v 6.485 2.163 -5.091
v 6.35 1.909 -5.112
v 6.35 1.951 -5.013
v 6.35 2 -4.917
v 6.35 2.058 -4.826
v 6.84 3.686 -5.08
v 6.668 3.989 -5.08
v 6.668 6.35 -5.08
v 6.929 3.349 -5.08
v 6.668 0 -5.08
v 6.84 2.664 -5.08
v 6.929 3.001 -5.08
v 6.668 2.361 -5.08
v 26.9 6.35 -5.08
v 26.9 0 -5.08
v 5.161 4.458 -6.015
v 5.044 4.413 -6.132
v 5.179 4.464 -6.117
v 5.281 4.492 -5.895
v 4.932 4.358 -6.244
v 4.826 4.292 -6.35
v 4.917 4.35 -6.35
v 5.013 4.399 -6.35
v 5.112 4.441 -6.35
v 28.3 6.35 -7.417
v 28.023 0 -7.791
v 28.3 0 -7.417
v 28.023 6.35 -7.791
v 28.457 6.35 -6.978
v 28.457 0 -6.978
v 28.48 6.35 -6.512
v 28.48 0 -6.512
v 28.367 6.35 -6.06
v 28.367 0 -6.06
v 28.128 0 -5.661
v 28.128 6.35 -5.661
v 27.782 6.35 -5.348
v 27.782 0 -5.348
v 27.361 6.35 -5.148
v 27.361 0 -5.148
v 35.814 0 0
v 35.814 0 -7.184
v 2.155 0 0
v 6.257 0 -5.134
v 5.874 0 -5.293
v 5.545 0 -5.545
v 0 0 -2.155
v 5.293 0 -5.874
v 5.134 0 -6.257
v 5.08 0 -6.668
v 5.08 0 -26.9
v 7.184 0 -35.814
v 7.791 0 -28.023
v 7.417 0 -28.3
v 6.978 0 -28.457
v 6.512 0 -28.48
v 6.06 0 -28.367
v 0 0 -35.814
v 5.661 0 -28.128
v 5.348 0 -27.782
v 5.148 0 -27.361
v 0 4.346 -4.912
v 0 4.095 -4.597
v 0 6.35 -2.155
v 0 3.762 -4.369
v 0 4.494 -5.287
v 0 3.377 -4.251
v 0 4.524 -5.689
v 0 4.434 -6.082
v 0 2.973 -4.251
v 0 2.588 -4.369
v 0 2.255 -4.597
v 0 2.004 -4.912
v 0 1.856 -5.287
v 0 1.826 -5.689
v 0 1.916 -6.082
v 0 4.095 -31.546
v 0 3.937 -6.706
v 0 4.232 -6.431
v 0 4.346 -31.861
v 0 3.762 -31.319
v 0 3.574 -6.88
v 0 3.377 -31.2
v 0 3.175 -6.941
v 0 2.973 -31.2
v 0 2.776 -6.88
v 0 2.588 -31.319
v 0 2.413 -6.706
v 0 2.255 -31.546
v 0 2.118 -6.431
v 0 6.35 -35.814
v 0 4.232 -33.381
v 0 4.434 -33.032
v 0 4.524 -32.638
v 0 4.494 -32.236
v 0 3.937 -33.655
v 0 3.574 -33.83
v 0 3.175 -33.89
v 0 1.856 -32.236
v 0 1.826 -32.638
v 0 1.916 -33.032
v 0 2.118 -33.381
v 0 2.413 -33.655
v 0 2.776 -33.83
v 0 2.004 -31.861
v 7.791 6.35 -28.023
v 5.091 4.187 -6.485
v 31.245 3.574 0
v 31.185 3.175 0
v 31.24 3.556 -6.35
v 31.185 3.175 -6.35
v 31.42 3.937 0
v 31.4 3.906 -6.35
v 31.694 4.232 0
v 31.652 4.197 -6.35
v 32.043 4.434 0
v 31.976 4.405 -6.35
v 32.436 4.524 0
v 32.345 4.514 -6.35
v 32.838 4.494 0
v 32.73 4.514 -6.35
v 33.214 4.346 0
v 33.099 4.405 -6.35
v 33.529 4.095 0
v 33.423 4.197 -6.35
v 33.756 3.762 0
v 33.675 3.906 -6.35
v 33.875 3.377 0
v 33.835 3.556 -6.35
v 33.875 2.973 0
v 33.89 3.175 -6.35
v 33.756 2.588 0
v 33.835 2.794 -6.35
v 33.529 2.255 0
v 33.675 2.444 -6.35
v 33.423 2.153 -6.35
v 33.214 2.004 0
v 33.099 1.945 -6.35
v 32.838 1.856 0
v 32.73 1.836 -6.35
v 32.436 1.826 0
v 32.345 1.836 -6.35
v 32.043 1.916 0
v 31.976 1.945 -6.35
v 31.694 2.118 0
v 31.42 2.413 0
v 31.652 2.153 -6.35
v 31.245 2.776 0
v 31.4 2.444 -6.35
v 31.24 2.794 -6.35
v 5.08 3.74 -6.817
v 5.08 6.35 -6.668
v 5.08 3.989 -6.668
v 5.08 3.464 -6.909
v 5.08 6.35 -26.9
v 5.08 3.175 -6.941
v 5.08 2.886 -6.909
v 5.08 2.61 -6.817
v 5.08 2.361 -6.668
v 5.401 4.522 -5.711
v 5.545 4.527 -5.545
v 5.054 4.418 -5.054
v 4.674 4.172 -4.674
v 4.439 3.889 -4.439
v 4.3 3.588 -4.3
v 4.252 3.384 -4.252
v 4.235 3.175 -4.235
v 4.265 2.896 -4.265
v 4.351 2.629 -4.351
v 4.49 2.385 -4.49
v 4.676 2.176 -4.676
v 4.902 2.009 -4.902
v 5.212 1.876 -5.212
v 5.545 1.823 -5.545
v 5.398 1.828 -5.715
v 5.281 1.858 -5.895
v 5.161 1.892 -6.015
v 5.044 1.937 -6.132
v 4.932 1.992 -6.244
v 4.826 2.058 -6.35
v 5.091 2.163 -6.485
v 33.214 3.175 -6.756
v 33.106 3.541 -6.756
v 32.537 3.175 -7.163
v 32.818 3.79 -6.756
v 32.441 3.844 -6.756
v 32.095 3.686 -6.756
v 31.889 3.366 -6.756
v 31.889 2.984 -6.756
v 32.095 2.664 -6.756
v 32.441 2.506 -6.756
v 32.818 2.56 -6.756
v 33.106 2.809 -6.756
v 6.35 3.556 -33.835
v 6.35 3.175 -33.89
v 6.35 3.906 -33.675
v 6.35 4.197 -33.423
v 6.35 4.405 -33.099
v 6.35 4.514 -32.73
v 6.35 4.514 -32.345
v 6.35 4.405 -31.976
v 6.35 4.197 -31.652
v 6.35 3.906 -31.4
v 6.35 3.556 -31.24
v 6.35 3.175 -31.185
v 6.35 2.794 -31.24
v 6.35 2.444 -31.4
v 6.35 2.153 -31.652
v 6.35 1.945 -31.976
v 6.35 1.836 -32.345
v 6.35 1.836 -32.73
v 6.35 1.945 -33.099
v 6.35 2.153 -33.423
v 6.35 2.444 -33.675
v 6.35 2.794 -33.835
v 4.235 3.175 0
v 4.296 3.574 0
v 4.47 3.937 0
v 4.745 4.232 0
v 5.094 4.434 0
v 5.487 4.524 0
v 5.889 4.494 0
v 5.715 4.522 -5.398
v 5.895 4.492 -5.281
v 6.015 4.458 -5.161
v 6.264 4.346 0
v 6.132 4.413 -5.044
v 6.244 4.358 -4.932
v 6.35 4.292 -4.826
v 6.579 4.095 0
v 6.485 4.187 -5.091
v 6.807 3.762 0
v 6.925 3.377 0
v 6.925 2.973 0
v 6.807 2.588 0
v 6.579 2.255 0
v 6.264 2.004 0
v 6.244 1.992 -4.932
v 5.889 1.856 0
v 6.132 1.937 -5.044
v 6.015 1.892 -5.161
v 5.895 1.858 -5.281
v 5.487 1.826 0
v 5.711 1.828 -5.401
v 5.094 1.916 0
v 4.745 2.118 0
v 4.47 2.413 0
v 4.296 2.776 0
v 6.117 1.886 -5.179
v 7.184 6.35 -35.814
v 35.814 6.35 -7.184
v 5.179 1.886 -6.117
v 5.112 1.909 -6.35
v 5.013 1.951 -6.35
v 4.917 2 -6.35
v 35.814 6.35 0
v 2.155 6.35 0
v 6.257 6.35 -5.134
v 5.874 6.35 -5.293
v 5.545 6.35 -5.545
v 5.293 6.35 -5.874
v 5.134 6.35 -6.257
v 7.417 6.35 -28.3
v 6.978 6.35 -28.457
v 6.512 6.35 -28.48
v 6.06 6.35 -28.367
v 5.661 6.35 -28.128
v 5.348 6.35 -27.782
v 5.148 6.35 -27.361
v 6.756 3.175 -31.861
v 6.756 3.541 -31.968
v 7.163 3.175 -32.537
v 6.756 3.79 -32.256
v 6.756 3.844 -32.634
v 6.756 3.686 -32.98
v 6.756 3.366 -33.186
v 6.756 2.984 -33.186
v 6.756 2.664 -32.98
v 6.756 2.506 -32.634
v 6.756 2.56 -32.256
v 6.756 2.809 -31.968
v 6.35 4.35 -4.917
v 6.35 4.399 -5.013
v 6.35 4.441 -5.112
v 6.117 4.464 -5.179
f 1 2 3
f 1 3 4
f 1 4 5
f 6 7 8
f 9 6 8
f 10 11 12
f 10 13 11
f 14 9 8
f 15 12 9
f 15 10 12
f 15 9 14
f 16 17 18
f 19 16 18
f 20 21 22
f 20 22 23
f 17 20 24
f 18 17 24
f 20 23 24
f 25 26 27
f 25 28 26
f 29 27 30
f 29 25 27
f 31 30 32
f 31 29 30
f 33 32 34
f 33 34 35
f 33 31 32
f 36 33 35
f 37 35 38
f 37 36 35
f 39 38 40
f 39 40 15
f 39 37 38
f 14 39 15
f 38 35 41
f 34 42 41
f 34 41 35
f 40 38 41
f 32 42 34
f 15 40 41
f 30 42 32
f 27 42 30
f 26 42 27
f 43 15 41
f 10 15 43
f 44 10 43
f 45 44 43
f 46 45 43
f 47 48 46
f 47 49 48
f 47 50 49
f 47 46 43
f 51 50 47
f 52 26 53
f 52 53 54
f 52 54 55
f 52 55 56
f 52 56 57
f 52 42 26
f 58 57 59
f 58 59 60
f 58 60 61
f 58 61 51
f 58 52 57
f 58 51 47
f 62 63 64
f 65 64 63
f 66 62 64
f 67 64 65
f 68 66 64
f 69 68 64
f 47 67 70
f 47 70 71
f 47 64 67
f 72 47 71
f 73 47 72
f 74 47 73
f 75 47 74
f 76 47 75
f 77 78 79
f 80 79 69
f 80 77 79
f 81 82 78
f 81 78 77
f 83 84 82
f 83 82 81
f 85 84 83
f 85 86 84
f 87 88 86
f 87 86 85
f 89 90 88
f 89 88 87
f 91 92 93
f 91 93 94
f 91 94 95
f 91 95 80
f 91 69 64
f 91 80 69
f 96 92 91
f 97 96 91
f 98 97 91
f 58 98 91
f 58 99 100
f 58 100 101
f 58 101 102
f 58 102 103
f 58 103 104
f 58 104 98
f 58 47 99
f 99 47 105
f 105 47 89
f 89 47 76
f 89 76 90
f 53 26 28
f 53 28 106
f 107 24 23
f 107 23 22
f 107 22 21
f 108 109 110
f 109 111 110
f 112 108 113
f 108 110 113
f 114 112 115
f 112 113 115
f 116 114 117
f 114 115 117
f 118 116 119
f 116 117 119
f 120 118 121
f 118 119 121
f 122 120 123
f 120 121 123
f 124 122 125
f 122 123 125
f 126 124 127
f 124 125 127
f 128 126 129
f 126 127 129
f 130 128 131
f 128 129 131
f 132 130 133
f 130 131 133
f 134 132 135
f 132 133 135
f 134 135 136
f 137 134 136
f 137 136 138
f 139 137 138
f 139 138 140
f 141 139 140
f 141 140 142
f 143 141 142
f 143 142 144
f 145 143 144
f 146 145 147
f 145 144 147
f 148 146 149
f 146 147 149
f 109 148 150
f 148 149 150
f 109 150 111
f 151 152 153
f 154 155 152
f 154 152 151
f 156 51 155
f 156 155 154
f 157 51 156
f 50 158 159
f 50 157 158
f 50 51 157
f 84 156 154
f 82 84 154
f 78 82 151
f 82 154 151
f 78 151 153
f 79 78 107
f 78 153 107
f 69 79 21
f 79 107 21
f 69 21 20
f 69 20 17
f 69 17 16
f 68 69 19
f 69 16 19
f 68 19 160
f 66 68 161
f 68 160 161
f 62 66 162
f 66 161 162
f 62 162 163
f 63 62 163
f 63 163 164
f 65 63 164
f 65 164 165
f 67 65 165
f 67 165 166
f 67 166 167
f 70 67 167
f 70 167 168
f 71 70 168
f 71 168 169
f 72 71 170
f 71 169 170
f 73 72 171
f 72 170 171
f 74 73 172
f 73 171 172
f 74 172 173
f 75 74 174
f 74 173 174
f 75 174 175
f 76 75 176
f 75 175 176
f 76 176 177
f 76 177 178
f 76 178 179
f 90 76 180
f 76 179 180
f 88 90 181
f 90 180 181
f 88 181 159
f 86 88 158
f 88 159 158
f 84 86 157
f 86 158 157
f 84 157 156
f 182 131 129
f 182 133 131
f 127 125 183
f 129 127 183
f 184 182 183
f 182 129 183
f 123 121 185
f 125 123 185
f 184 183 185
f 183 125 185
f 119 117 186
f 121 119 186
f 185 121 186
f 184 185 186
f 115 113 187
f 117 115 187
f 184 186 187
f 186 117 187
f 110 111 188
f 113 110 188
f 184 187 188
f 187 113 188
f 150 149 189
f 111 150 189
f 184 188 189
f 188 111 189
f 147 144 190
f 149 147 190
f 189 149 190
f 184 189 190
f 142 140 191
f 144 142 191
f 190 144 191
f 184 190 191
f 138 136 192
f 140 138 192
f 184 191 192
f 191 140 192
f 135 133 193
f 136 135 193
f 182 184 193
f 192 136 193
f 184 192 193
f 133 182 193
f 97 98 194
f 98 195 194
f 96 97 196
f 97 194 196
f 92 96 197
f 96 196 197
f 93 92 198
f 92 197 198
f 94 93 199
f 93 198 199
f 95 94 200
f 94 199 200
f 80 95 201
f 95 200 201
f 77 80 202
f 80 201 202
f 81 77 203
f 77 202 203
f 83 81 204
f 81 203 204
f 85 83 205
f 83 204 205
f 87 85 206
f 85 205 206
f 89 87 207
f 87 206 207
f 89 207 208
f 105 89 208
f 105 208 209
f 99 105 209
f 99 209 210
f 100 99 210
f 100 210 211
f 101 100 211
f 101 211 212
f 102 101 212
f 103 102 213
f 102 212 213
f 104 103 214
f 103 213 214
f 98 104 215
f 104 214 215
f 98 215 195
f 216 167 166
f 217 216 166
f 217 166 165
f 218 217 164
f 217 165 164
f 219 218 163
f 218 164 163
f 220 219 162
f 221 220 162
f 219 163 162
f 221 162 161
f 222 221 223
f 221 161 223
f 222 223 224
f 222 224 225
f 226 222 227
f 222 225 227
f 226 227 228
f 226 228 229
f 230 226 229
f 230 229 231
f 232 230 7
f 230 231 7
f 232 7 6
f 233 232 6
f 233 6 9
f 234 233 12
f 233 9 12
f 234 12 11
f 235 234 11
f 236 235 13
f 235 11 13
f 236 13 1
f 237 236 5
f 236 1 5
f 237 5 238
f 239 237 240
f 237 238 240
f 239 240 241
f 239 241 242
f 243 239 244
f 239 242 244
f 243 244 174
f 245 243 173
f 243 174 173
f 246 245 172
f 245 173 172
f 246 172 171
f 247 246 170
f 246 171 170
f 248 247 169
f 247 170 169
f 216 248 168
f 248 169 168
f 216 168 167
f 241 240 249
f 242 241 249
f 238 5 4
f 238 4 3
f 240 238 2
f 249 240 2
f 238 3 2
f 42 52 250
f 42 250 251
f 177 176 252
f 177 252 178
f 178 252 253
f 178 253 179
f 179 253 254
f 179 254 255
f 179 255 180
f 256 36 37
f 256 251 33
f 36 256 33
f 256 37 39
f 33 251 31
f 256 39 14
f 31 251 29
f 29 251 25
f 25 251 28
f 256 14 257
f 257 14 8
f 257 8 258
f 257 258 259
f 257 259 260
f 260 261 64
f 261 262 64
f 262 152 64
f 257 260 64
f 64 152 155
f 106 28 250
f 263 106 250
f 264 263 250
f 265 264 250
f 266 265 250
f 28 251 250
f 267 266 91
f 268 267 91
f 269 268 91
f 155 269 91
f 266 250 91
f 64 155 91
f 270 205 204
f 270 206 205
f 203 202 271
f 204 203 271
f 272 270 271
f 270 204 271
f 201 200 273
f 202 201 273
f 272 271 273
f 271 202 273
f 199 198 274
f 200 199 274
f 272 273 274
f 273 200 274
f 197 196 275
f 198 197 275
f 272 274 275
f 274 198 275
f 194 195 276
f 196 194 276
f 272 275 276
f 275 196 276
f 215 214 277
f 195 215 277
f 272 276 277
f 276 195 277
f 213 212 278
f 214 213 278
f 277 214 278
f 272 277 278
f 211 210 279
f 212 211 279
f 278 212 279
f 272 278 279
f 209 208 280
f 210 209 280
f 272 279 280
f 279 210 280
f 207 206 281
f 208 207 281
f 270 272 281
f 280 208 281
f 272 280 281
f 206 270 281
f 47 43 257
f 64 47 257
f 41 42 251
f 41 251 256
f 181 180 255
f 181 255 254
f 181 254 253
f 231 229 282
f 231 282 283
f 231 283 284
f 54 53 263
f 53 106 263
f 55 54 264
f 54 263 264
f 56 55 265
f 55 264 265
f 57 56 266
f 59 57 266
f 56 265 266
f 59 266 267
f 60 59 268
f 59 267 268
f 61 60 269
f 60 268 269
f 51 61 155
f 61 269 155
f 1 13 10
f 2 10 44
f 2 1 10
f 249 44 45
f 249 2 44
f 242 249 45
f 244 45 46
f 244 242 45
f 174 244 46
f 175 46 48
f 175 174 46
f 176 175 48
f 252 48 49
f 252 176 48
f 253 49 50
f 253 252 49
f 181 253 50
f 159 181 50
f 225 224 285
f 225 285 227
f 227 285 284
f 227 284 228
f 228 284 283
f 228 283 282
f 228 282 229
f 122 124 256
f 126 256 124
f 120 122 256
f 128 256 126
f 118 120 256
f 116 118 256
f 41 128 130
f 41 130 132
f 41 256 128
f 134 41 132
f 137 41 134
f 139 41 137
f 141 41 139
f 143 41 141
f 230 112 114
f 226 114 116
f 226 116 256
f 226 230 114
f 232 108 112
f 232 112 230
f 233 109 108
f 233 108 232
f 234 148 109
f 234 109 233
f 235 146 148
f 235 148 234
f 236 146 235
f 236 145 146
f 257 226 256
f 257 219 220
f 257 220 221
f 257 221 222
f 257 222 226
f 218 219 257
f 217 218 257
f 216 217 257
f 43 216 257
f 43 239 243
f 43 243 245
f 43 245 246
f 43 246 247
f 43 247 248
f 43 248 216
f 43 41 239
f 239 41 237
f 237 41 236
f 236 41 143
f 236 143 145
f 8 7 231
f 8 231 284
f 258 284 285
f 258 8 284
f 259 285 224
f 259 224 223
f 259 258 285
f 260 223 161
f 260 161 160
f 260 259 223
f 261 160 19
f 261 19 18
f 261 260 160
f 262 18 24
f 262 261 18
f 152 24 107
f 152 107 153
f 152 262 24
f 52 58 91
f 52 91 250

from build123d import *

# Parameters (mm, degrees)
BOSS_EXTRUDE1_DEPTH           = 6.35
FILLET1_R                     = 1.588
TAP_DRILL_FOR_6_32_TAP2_D     = 2.7051
TAP_DRILL_FOR_6_32_TAP2_DEPTH = 6.35
TAP_DRILL_FOR_6_32_TAP2_TIP   = 0.81269403
TAP_DRILL_FOR_6_32_TAP1_D     = 2.7051
TAP_DRILL_FOR_6_32_TAP1_DEPTH = 6.35
TAP_DRILL_FOR_6_32_TAP1_TIP   = 0.81269403
CHAMFER1_SIZE                 = 2.155


with BuildPart() as part:
    # Sketch1 → Boss-Extrude1 (new body)
    with BuildSketch(Plane(origin=(0, 0, 0), x_dir=(1, 0, 0), z_dir=(0, 1, 0))):
        Polygon((0, 0), (0, 35.814), (7.183953537, 35.814), (35.814, 7.183953537), (35.814, 0), align=None)
        Polygon((5.08, 30.73374864), (5.08, 5.08), (30.73374864, 5.08), align=None, mode=Mode.SUBTRACT)
    extrude(amount=BOSS_EXTRUDE1_DEPTH)

    # Fillet1
    fillet1_edges = [part.edges().sort_by_distance(p)[0] for p in [
        (30.73374864, 3.175, -5.08),
        (5.08, 3.175, -30.73374864),
        (5.08, 3.175, -5.08),
    ]]
    fillet(fillet1_edges, radius=FILLET1_R)

    # Tap Drill for #6-32 Tap2
    with Locations(Plane.ZY):
        with Locations((-5.588, 3.175), (-32.5374, 3.175)):
            Hole(TAP_DRILL_FOR_6_32_TAP2_D / 2, depth=TAP_DRILL_FOR_6_32_TAP2_DEPTH)
            with Locations((0, 0, -(TAP_DRILL_FOR_6_32_TAP2_DEPTH + TAP_DRILL_FOR_6_32_TAP2_TIP / 2))):  # 118° drill point
                Cone(0, TAP_DRILL_FOR_6_32_TAP2_D / 2, TAP_DRILL_FOR_6_32_TAP2_TIP, mode=Mode.SUBTRACT)

    # Tap Drill for #6-32 Tap1
    with Locations(Plane.XY):
        with Locations((32.5374, 3.175), (5.588, 3.175)):
            Hole(TAP_DRILL_FOR_6_32_TAP1_D / 2, depth=TAP_DRILL_FOR_6_32_TAP1_DEPTH)
            with Locations((0, 0, -(TAP_DRILL_FOR_6_32_TAP1_DEPTH + TAP_DRILL_FOR_6_32_TAP1_TIP / 2))):  # 118° drill point
                Cone(0, TAP_DRILL_FOR_6_32_TAP1_D / 2, TAP_DRILL_FOR_6_32_TAP1_TIP, mode=Mode.SUBTRACT)

    # Chamfer1
    chamfer1_edges = [part.edges().sort_by_distance(p)[0] for p in [
        (0, 3.175, 0),
    ]]
    chamfer(chamfer1_edges, length=CHAMFER1_SIZE)


solid = part.part
